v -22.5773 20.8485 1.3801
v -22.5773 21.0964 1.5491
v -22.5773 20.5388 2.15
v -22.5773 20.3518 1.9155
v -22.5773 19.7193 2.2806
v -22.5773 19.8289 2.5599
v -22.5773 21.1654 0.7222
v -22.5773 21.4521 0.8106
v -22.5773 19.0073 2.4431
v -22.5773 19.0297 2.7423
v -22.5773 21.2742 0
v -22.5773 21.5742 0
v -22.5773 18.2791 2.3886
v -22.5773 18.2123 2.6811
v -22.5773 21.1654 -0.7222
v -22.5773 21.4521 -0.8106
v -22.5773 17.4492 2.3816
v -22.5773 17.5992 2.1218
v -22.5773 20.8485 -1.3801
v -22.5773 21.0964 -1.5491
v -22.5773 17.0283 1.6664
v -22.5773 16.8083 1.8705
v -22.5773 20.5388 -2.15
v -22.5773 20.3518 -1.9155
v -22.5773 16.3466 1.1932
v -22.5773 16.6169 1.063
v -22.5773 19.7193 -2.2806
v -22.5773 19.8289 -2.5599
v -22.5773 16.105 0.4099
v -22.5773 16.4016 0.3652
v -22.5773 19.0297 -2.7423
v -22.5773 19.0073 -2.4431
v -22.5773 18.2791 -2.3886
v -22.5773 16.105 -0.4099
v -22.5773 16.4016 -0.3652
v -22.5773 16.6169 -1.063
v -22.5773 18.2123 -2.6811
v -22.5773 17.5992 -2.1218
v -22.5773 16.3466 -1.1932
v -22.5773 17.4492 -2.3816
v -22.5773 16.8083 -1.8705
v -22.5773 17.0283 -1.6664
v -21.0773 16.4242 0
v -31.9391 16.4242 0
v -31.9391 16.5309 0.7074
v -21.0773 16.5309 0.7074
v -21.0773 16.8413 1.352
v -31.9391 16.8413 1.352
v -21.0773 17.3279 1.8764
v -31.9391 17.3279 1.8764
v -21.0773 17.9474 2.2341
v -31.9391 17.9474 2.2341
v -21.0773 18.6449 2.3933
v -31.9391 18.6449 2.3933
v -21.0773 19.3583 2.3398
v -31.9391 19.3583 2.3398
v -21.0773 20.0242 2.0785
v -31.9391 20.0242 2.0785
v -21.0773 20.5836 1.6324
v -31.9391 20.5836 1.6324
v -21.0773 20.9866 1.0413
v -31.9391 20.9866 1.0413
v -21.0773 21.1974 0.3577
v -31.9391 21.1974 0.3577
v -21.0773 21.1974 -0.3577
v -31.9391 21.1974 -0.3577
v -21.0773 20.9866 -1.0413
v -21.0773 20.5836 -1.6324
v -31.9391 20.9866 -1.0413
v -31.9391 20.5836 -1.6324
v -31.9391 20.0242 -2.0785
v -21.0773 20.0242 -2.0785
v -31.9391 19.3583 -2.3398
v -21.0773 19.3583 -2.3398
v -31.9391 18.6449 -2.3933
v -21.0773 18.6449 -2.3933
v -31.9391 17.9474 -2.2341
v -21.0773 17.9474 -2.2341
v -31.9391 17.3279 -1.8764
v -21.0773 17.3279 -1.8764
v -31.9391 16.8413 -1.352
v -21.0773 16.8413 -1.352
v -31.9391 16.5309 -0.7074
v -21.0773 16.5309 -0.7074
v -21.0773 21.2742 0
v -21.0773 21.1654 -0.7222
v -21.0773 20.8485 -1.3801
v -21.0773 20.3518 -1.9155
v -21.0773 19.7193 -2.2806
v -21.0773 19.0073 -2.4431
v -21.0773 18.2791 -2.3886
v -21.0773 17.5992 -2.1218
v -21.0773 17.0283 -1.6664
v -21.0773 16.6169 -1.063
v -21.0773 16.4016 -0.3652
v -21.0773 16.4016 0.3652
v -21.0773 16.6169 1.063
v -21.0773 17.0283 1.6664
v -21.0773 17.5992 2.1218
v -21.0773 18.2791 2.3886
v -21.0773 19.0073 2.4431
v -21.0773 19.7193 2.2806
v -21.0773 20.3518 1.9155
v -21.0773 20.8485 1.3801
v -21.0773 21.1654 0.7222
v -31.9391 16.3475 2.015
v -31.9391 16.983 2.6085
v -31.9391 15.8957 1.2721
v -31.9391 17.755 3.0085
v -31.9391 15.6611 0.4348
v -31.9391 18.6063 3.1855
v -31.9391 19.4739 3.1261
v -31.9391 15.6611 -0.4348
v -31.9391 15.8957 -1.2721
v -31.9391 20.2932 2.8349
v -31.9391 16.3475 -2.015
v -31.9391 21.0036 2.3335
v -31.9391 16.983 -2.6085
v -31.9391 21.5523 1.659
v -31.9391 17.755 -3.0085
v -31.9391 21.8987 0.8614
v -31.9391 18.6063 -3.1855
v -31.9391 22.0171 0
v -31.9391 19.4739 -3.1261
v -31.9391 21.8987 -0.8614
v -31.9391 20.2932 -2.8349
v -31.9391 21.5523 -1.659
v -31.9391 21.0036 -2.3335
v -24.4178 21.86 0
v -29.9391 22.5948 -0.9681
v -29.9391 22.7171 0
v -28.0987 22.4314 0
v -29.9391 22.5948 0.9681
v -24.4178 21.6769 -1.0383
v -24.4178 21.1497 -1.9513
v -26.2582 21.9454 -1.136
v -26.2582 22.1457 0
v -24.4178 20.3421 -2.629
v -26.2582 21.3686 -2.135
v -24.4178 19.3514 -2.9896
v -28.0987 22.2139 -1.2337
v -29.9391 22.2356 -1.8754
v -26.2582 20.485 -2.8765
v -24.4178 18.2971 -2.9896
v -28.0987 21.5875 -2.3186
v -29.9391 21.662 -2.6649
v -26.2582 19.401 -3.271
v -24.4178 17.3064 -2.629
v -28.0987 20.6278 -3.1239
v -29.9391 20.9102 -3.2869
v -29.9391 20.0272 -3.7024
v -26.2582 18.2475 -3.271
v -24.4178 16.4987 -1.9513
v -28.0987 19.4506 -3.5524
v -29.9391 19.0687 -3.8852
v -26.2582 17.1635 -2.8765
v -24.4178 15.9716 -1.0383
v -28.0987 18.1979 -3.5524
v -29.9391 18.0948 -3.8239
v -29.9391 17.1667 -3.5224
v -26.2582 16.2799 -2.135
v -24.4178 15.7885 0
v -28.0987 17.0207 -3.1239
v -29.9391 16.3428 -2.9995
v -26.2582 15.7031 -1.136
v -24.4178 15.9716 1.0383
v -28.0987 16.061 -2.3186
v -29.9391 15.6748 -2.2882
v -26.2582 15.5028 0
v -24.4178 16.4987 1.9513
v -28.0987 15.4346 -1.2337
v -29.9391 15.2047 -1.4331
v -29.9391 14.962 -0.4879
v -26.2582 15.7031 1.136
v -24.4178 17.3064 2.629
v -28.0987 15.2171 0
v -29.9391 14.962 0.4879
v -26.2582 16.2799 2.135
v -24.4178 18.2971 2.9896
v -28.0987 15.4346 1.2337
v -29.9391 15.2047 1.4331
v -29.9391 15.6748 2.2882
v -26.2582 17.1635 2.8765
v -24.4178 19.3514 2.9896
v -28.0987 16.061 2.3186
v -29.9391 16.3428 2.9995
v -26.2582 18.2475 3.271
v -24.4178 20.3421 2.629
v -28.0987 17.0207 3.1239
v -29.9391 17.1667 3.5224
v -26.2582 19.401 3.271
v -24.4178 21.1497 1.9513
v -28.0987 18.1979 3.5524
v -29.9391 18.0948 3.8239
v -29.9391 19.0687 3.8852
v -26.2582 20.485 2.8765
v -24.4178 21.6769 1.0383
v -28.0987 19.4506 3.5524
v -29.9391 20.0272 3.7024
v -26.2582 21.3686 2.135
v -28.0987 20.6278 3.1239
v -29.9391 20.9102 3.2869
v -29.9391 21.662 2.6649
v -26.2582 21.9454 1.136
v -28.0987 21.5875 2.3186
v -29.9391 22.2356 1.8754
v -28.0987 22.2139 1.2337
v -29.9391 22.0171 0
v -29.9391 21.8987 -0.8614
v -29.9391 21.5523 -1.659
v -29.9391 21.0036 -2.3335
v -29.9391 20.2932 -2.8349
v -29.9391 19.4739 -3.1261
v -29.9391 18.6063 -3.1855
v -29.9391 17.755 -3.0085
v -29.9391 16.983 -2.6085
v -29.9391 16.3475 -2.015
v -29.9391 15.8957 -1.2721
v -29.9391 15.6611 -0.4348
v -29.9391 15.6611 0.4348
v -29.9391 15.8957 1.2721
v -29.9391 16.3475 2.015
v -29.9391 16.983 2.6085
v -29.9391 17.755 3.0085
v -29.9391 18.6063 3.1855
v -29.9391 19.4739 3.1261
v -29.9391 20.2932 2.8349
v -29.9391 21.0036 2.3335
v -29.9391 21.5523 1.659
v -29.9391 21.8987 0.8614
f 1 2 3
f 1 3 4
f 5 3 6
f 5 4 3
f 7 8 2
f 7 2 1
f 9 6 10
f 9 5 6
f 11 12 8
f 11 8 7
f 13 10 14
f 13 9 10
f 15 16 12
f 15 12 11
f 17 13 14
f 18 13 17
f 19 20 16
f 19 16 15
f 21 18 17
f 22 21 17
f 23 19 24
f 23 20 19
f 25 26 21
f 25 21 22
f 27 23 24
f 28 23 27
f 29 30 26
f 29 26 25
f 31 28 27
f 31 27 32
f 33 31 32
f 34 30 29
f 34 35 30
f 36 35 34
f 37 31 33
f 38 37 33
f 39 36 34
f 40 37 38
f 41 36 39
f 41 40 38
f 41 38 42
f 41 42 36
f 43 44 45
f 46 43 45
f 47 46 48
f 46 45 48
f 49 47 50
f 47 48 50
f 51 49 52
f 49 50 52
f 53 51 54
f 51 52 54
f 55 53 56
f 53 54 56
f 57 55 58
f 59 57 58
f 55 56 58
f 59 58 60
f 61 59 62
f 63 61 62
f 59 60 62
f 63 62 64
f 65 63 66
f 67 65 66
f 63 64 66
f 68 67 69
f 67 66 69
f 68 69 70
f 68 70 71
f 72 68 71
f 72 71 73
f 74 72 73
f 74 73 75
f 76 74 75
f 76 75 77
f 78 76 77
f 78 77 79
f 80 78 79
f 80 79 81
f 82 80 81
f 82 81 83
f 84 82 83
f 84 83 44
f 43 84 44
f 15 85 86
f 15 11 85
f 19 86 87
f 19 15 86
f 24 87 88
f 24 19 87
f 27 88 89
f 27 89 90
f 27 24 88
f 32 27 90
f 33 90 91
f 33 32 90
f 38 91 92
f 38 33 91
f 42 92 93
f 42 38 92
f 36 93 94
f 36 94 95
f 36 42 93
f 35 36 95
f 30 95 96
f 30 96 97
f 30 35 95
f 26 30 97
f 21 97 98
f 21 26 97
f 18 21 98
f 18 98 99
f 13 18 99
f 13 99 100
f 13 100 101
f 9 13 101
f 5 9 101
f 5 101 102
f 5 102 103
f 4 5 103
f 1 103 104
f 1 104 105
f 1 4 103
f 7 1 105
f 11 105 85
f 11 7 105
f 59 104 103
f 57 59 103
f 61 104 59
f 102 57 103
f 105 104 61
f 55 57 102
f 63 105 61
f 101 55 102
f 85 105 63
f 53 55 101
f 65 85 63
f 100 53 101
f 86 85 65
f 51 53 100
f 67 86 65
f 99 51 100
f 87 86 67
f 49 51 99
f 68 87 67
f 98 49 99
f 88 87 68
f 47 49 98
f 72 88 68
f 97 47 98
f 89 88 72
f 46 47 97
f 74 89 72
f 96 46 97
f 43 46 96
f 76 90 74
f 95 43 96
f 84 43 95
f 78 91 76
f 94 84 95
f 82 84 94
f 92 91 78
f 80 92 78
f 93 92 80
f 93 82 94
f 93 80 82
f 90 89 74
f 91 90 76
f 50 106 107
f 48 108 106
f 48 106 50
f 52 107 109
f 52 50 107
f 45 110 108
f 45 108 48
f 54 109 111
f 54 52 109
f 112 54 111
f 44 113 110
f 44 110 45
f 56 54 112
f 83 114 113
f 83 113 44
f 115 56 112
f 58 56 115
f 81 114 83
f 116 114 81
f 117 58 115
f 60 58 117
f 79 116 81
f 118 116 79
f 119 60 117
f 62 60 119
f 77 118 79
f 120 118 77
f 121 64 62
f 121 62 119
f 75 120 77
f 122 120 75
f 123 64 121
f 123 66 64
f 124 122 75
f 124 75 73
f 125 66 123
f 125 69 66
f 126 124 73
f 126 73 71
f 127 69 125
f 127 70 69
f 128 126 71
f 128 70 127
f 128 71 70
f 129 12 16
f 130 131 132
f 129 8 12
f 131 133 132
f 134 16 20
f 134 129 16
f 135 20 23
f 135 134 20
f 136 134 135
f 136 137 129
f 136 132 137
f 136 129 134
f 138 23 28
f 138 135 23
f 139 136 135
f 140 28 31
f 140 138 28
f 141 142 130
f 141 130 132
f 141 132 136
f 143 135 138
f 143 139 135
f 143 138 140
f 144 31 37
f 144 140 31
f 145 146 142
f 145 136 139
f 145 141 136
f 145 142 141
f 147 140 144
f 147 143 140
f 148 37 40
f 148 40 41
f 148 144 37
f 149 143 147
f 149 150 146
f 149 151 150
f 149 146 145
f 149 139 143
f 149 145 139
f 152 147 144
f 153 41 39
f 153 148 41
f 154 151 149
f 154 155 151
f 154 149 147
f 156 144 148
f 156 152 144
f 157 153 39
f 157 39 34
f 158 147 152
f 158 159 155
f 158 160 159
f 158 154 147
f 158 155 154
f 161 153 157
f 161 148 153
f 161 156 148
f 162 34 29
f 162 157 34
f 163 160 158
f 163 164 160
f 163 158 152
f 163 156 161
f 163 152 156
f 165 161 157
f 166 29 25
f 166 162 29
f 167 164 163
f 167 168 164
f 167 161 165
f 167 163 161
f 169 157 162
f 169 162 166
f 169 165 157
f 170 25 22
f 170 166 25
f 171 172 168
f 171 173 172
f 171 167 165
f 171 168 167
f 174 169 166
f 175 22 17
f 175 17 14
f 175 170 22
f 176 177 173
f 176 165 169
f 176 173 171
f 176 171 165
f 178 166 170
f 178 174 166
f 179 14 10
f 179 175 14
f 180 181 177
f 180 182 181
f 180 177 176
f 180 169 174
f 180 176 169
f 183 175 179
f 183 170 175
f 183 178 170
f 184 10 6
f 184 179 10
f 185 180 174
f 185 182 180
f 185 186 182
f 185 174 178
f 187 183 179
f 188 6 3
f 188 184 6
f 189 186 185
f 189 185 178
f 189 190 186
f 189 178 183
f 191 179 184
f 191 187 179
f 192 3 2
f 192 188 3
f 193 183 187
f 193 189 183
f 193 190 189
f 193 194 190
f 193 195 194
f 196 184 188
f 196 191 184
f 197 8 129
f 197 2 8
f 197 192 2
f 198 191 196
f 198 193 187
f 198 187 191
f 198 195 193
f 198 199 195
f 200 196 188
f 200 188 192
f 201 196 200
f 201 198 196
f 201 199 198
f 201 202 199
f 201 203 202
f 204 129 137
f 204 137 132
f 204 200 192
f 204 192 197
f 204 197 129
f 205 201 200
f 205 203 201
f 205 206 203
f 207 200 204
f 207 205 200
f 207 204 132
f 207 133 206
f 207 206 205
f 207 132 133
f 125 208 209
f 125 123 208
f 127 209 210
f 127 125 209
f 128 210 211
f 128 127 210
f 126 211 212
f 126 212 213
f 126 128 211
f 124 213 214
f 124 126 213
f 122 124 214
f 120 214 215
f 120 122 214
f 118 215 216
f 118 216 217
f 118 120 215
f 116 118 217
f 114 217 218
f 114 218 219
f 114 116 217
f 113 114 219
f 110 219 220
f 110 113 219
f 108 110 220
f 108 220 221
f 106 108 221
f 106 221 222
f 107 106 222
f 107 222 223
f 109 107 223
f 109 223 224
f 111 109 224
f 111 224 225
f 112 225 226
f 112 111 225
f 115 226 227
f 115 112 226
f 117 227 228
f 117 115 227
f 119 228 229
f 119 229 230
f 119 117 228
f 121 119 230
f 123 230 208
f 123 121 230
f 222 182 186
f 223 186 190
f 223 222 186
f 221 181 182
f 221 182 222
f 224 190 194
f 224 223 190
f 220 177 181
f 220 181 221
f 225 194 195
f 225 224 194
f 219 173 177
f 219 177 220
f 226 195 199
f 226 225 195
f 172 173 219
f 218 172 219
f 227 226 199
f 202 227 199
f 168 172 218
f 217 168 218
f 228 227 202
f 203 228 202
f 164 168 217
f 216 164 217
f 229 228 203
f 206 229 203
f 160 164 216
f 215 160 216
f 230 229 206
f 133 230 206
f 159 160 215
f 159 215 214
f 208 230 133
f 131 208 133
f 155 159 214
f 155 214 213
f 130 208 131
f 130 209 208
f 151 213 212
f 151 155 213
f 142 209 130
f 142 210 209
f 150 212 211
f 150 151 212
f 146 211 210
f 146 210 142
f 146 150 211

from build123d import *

# Parameters (mm, degrees)
F2_R     = 2.4
F3_DEPTH = 25


with BuildPart() as f1:
    # F0 (on Top) → F1 (revolve)
    with BuildSketch(Plane.XY):
        Polygon((-29.93912, 22.017142), (-31.93912, 22.017142), (-31.93912, 19.824239), (-31.93912, 18.824239), (-21.077308, 18.824239), (-21.077308, 21.274239), (-22.577308, 21.274239), (-22.577308, 21.574239), (-29.93912, 22.717142), align=None)
    revolve(axis=Axis((-26.508214, 18.824239, 0), (-1, 0, 0)))

    # F2 (on face) → F3 (cut)
    with BuildSketch(Plane(origin=(-31.93912, 0, 0), x_dir=(0, -1, 0), z_dir=(-1, 0, 0))):
        with Locations((-18.824239, 0)):
            Circle(F2_R)
    extrude(amount=-F3_DEPTH, mode=Mode.SUBTRACT)


solid = f1.part
